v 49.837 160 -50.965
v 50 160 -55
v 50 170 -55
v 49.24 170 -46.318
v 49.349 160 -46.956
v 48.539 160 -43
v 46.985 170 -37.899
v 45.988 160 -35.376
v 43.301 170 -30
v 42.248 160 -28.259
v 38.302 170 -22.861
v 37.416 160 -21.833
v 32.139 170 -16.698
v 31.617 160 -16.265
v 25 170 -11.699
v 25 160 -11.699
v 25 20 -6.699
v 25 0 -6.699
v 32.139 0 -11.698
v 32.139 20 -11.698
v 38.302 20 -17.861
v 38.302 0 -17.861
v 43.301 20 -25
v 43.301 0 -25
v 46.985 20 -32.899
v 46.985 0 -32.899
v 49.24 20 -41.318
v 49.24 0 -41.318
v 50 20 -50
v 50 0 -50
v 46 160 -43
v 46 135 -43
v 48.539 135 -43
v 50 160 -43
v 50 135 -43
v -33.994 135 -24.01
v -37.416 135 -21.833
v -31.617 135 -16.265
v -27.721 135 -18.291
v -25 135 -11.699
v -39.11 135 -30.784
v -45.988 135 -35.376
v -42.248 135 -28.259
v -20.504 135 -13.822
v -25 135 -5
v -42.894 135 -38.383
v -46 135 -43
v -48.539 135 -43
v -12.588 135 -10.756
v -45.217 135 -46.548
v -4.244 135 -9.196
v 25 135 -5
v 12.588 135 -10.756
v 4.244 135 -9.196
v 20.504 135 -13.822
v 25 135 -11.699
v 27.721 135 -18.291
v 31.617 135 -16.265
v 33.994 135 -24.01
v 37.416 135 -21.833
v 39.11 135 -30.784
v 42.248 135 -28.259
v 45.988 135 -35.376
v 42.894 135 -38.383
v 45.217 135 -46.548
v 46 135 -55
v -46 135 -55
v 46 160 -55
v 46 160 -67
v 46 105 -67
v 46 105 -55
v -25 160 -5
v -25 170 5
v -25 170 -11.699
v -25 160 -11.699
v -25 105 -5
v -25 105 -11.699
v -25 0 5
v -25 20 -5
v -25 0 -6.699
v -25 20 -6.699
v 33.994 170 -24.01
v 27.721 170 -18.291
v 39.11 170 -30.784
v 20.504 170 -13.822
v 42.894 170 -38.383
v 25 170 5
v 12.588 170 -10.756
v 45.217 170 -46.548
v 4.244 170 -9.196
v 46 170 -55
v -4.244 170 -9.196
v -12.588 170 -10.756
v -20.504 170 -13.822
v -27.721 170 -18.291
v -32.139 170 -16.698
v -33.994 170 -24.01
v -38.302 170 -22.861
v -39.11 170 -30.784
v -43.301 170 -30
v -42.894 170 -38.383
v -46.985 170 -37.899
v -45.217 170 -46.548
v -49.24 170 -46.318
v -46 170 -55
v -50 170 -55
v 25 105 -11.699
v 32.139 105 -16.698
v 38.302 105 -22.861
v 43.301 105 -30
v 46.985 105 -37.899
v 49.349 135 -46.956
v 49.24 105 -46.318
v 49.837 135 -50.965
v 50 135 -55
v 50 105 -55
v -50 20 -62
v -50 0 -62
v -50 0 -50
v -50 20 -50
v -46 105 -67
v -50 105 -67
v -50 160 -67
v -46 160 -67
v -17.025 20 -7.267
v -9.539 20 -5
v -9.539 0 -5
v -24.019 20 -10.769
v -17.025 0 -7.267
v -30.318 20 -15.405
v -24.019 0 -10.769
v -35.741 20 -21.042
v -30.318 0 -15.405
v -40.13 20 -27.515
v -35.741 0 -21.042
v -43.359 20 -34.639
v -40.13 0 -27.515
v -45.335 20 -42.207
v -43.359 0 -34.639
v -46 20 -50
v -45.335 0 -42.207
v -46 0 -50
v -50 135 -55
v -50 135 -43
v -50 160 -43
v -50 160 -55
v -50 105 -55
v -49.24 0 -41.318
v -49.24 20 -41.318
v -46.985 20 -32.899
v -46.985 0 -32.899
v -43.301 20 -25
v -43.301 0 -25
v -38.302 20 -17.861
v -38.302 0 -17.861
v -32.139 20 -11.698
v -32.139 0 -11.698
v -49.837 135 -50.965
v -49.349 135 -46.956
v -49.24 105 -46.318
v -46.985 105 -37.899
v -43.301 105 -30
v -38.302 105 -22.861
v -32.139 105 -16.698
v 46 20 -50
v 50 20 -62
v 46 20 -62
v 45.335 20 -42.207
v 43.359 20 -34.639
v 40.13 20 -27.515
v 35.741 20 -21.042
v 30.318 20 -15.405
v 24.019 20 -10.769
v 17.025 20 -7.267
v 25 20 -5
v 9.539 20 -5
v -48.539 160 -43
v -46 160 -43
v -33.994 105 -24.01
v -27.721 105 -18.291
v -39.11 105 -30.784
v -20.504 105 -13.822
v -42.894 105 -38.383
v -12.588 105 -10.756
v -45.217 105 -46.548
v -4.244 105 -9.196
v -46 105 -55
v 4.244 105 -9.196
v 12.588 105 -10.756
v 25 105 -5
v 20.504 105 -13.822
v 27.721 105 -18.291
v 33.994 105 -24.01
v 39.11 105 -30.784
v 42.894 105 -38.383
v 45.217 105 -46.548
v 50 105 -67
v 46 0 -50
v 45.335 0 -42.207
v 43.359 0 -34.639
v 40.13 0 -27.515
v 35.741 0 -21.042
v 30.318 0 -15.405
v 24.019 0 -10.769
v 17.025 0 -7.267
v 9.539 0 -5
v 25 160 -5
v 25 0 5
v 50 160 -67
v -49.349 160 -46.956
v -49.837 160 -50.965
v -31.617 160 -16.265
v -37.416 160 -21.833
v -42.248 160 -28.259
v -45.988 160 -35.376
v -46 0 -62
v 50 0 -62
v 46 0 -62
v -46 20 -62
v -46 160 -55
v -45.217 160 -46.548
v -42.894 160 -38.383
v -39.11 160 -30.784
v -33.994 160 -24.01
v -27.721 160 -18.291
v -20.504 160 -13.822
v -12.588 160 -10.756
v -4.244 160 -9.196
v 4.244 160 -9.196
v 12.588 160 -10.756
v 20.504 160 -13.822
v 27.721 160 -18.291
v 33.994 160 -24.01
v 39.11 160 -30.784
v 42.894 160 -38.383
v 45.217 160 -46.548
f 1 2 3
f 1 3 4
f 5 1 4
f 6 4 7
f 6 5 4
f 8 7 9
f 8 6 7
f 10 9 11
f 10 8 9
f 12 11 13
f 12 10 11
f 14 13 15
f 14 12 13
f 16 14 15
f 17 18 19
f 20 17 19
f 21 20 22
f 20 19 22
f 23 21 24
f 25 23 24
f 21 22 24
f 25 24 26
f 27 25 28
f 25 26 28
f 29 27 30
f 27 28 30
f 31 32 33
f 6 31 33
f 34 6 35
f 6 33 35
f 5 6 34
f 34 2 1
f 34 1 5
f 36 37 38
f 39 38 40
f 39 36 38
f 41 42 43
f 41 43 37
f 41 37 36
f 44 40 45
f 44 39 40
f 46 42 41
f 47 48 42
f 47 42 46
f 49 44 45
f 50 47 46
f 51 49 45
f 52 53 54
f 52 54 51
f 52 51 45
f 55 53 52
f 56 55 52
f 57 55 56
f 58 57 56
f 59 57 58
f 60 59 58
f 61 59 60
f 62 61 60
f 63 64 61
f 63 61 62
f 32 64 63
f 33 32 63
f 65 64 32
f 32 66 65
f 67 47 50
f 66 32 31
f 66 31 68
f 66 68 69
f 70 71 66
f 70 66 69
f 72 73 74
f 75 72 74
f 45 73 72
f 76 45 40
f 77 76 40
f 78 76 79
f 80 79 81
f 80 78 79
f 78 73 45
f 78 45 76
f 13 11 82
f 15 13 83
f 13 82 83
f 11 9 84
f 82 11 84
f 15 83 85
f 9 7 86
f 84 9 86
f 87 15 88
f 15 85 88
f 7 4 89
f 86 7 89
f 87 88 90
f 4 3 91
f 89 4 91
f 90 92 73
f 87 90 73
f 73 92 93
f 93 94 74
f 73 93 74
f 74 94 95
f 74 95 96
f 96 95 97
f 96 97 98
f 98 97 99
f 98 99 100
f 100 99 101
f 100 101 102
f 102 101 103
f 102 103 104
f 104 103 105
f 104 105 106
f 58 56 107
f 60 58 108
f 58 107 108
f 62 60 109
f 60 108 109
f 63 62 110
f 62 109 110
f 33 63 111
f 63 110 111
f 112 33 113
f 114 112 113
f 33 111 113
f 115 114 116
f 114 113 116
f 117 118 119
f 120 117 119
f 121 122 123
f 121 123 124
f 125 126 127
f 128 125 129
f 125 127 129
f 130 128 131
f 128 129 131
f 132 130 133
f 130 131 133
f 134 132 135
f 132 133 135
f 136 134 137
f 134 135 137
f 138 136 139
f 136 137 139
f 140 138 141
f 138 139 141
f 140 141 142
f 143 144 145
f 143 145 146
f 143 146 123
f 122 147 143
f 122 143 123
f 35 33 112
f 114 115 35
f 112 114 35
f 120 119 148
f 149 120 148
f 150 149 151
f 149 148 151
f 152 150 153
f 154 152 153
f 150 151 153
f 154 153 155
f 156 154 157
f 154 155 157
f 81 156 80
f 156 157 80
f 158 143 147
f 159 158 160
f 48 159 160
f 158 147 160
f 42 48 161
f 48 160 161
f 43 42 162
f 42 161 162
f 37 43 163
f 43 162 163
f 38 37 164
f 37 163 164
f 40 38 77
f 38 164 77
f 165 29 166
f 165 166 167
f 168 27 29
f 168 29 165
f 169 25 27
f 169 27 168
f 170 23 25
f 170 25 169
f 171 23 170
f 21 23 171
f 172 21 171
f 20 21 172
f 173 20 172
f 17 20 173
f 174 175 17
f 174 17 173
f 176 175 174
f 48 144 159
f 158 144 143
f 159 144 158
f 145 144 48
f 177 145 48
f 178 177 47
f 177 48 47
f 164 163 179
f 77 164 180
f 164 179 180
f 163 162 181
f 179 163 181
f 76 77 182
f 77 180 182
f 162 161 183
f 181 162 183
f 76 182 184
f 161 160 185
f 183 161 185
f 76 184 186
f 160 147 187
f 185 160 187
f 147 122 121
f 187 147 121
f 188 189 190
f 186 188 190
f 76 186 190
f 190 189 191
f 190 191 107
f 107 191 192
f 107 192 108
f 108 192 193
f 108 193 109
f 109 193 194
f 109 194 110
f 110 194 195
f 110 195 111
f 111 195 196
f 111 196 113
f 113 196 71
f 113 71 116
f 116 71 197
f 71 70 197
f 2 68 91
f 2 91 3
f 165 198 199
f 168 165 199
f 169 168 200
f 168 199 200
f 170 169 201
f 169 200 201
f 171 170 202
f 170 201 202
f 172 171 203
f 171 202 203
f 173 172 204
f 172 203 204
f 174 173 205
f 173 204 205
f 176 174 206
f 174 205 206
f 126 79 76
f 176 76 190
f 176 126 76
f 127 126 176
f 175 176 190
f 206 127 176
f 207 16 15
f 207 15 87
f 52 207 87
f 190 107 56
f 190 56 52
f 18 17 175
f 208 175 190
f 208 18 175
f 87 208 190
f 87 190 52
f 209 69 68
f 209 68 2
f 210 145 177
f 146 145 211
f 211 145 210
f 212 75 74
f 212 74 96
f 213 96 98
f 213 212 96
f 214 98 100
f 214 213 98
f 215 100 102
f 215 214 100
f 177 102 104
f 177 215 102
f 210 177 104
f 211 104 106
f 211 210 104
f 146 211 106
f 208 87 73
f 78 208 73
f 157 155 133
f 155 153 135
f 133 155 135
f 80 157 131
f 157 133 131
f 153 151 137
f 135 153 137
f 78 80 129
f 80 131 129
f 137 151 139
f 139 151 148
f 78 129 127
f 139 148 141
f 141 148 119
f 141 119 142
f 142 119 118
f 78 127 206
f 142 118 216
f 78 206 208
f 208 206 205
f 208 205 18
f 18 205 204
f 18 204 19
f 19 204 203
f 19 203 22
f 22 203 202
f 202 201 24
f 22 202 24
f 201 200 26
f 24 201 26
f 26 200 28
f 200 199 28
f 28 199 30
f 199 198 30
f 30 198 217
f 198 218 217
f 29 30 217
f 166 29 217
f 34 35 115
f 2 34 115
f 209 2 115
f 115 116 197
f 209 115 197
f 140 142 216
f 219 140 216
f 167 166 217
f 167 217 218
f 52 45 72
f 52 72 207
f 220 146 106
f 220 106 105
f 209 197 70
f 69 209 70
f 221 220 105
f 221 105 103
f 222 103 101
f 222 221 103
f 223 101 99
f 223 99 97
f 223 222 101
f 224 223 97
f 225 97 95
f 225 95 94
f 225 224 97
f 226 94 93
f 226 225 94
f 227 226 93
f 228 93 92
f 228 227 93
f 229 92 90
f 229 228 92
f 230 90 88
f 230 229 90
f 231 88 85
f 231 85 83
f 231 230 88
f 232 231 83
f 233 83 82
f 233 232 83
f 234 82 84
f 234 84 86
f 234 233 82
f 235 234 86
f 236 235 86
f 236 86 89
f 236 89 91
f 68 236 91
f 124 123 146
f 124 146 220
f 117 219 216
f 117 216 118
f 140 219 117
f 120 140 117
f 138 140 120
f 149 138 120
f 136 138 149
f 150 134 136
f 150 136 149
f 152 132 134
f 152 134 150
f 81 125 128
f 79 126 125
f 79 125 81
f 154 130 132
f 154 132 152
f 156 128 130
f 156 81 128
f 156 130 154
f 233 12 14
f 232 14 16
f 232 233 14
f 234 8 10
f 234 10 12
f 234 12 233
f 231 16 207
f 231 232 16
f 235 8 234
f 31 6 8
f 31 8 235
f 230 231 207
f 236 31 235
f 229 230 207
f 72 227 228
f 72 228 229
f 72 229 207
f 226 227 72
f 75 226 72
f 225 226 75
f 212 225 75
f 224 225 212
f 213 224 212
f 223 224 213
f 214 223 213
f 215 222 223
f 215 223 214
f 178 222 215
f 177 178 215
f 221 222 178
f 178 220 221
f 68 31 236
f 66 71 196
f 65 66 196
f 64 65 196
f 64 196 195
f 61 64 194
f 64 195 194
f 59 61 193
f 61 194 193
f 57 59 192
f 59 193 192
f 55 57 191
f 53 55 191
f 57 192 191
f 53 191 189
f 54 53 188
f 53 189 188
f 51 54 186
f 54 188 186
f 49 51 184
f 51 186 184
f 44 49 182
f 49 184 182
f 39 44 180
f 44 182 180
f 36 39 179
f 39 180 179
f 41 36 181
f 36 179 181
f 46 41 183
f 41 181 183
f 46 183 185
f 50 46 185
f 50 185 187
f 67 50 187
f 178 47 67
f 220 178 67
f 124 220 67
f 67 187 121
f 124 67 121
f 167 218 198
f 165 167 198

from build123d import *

# Parameters (mm, degrees)
SKETCH_1_W      = 50
SKETCH_1_H      = 10
EXTRUDE_1_DEPTH = 160
EXTRUDE_START   = 105
EXTRUDE_3_DEPTH = 30
EXTRUDE_9_DEPTH = 20
SKETCH_3_W      = 4
SKETCH_3_H      = 24
EXTRUDE_4_DEPTH = 25
EXTRUDE_8_DEPTH = 10


# Read off the part's stored shape, not the designer's step: 凸台-拉伸3
with BuildPart() as part:
    # 草图1 → 凸台-拉伸1 (new body)
    with BuildSketch(Plane(origin=(0, 0, 0), x_dir=(1, 0, 0), z_dir=(0, 1, 0))):
        Rectangle(SKETCH_1_W, SKETCH_1_H)
    extrude(amount=EXTRUDE_1_DEPTH)

    # 凸台-拉伸3 outline → 凸台-拉伸3 (add)
    with BuildSketch(Plane(origin=(0, 0, 0), x_dir=(1, 0, 0), z_dir=(0, 1, 0)).offset(EXTRUDE_START)):
        with BuildLine():
            Line((-25, 11.698729811), (-25, 5))
            Line((-25, 5), (25, 5))
            Line((25, 5), (25, 11.698729811))
            ThreePointArc((25, 11.698729811), (43.301270189, 30), (50, 55))
            Line((50, 55), (50, 67))
            Line((50, 67), (46, 67))
            Line((46, 67), (46, 55))
            ThreePointArc((46, 55), (0, 9), (-46, 55))
            Line((-46, 55), (-46, 67))
            Line((-46, 67), (-50, 67))
            Line((-50, 67), (-50, 55))
            ThreePointArc((-50, 55), (-43.301270189, 30), (-25, 11.698729811))
        make_face()
    extrude(amount=EXTRUDE_3_DEPTH)

    # 草图6 → 凸台-拉伸9 (add)
    with BuildSketch(Plane.XZ):
        with BuildLine():
            Line((-17.162962033, 1.601757508), (17.472067362, 1.754788629))
            Line((17.472067362, 1.754788629), (25, -5))
            Line((25, -5), (25, -6.698729811))
            ThreePointArc((25, -6.698729811), (43.301270189, -25), (50, -50))
            Line((50, -50), (50, -62))
            Line((50, -62), (46, -62))
            Line((46, -62), (46, -50))
            ThreePointArc((46, -50), (0, -4), (-46, -50))
            Line((-46, -50), (-46, -62))
            Line((-46, -62), (-50, -62))
            Line((-50, -62), (-50, -50))
            ThreePointArc((-50, -50), (-43.301270189, -25), (-25, -6.698729811))
            Line((-25, -6.698729811), (-25, -5))
            Line((-25, -5), (-17.162962033, 1.601757508))
        make_face()
    extrude(amount=-EXTRUDE_9_DEPTH)

    # 草图3 → 凸台-拉伸4 (add)
    with BuildSketch(Plane(origin=(0, 135, 0), x_dir=(1, 0, 0), z_dir=(0, 1, 0))):
        with Locations((-48, 55)):
            Rectangle(SKETCH_3_W, SKETCH_3_H)
        with Locations((48, 55)):
            Rectangle(SKETCH_3_W, SKETCH_3_H)
    extrude(amount=EXTRUDE_4_DEPTH)

    # 草图4 → 凸台-拉伸8 (add)
    with BuildSketch(Plane(origin=(0, 160, 0), x_dir=(1, 0, 0), z_dir=(0, 1, 0))):
        with BuildLine():
            Line((-50, 55), (-46, 55))
            ThreePointArc((-46, 55), (0, 9), (46, 55))
            Line((46, 55), (50, 55))
            ThreePointArc((50, 55), (43.301270189, 30), (25, 11.698729811))
            Line((25, 11.698729811), (25, -5))
            Line((25, -5), (-25, -5))
            Line((-25, -5), (-25, 11.698729811))
            ThreePointArc((-25, 11.698729811), (-43.301270189, 30), (-50, 55))
        make_face()
    extrude(amount=EXTRUDE_8_DEPTH)


solid = part.part
